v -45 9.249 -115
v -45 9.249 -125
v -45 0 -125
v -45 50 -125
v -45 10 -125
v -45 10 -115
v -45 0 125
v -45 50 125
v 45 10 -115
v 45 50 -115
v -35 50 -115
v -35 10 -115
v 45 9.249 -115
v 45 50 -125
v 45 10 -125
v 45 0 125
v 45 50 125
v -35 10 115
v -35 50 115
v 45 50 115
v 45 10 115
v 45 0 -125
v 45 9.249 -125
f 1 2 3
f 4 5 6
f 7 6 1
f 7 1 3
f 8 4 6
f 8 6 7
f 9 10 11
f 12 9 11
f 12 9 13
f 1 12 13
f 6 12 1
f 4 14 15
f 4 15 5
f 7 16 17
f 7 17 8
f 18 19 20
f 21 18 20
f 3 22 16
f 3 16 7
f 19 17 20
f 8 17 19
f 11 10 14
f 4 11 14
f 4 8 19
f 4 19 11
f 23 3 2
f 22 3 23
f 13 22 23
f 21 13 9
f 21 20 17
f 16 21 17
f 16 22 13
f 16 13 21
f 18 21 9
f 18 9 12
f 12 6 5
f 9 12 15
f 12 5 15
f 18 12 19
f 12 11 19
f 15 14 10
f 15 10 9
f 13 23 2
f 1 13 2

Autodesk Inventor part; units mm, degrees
ref_plane "YZ Plane" through (0, 0, 0) normal (1, 0, 0) x (0, 1, 0)
ref_plane "XZ Plane" through (0, 0, 0) normal (0, 1, 0) x (-1, 0, 0)
ref_plane "XY Plane" through (0, 0, 0) normal (0, 0, 1) x (1, 0, 0)
sketch "Sketch1" plane through (0, 0, 0) normal (0, 1, 0) x (-1, 0, 0)
  line L0 (-45, 125) -> (45, 125)
  line L1 (45, 125) -> (45, -125)
  line L2 (45, -125) -> (-45, -125)
  line L3 (-45, -125) -> (-45, 125)
  line L4 (-45, 125) -> (45, -125) construction
  line L5 (45, 125) -> (-45, -125) construction
  point P0 (0, 0)
  dimension "d0" = 250
  dimension "d1" = 90
extrude "Extrusion1" add sketch "Sketch1" along normal blind 10
sketch "Sketch2" plane through (-45, 0, 125) normal (0, 0, 1) x (1, 0, 0)
  line L0 (90, 10) -> (0, 10) projected
  line L1 (0, 10) -> (90, 10)
  line L2 (90, 10) -> (90, 50)
  line L3 (90, 50) -> (0, 50)
  line L4 (0, 50) -> (0, 10)
  point P0 (45, 0)
  dimension "d4" = 40
extrude "Extrusion2" add sketch "Sketch2" against normal blind 10
sketch "Sketch3" plane through (45, 0, -125) normal (0, 0, -1) x (-1, 0, 0)
  line L0 (0, 0) -> (0, 50) projected
  line L1 (90, 0) -> (90, 50) projected
  line L2 (0, 9.2486) -> (90, 9.2486)
  line L3 (90, 9.2486) -> (90, 50)
  line L4 (90, 50) -> (0, 50)
  line L5 (0, 50) -> (0, 9.2486)
  point P0 (45, 0)
  point P1 (90, 9.2486)
extrude "Extrusion3" cut sketch "Sketch3" against normal blind 10
sketch "Sketch4" plane through (45, 0, -125) normal (0, 0, -1) x (-1, 0, 0)
  line L0 (90, 10) -> (0, 10) projected
  line L1 (90, 10) -> (90, 50) projected
  line L2 (0, 10) -> (90, 10)
  line L3 (90, 10) -> (90, 50)
  line L4 (90, 50) -> (0, 50)
  line L5 (0, 50) -> (0, 10)
  point P0 (45, 0)
extrude "Extrusion4" add sketch "Sketch4" against normal blind 10
sketch "Sketch5" plane through (-45, 0, -125) normal (-1, 0, 0) x (0, 0, 1)
  line L0 (10, 50) -> (10, 10) projected
  line L1 (240, 50) -> (240, 10) projected
  line L2 (10, 10) -> (240, 10)
  line L3 (240, 10) -> (240, 50)
  line L4 (240, 50) -> (10, 50)
  line L5 (10, 50) -> (10, 10)
  point P0 (125, 0)
extrude "Extrusion5" add sketch "Sketch5" against normal blind 10
properties part number "aaa"
